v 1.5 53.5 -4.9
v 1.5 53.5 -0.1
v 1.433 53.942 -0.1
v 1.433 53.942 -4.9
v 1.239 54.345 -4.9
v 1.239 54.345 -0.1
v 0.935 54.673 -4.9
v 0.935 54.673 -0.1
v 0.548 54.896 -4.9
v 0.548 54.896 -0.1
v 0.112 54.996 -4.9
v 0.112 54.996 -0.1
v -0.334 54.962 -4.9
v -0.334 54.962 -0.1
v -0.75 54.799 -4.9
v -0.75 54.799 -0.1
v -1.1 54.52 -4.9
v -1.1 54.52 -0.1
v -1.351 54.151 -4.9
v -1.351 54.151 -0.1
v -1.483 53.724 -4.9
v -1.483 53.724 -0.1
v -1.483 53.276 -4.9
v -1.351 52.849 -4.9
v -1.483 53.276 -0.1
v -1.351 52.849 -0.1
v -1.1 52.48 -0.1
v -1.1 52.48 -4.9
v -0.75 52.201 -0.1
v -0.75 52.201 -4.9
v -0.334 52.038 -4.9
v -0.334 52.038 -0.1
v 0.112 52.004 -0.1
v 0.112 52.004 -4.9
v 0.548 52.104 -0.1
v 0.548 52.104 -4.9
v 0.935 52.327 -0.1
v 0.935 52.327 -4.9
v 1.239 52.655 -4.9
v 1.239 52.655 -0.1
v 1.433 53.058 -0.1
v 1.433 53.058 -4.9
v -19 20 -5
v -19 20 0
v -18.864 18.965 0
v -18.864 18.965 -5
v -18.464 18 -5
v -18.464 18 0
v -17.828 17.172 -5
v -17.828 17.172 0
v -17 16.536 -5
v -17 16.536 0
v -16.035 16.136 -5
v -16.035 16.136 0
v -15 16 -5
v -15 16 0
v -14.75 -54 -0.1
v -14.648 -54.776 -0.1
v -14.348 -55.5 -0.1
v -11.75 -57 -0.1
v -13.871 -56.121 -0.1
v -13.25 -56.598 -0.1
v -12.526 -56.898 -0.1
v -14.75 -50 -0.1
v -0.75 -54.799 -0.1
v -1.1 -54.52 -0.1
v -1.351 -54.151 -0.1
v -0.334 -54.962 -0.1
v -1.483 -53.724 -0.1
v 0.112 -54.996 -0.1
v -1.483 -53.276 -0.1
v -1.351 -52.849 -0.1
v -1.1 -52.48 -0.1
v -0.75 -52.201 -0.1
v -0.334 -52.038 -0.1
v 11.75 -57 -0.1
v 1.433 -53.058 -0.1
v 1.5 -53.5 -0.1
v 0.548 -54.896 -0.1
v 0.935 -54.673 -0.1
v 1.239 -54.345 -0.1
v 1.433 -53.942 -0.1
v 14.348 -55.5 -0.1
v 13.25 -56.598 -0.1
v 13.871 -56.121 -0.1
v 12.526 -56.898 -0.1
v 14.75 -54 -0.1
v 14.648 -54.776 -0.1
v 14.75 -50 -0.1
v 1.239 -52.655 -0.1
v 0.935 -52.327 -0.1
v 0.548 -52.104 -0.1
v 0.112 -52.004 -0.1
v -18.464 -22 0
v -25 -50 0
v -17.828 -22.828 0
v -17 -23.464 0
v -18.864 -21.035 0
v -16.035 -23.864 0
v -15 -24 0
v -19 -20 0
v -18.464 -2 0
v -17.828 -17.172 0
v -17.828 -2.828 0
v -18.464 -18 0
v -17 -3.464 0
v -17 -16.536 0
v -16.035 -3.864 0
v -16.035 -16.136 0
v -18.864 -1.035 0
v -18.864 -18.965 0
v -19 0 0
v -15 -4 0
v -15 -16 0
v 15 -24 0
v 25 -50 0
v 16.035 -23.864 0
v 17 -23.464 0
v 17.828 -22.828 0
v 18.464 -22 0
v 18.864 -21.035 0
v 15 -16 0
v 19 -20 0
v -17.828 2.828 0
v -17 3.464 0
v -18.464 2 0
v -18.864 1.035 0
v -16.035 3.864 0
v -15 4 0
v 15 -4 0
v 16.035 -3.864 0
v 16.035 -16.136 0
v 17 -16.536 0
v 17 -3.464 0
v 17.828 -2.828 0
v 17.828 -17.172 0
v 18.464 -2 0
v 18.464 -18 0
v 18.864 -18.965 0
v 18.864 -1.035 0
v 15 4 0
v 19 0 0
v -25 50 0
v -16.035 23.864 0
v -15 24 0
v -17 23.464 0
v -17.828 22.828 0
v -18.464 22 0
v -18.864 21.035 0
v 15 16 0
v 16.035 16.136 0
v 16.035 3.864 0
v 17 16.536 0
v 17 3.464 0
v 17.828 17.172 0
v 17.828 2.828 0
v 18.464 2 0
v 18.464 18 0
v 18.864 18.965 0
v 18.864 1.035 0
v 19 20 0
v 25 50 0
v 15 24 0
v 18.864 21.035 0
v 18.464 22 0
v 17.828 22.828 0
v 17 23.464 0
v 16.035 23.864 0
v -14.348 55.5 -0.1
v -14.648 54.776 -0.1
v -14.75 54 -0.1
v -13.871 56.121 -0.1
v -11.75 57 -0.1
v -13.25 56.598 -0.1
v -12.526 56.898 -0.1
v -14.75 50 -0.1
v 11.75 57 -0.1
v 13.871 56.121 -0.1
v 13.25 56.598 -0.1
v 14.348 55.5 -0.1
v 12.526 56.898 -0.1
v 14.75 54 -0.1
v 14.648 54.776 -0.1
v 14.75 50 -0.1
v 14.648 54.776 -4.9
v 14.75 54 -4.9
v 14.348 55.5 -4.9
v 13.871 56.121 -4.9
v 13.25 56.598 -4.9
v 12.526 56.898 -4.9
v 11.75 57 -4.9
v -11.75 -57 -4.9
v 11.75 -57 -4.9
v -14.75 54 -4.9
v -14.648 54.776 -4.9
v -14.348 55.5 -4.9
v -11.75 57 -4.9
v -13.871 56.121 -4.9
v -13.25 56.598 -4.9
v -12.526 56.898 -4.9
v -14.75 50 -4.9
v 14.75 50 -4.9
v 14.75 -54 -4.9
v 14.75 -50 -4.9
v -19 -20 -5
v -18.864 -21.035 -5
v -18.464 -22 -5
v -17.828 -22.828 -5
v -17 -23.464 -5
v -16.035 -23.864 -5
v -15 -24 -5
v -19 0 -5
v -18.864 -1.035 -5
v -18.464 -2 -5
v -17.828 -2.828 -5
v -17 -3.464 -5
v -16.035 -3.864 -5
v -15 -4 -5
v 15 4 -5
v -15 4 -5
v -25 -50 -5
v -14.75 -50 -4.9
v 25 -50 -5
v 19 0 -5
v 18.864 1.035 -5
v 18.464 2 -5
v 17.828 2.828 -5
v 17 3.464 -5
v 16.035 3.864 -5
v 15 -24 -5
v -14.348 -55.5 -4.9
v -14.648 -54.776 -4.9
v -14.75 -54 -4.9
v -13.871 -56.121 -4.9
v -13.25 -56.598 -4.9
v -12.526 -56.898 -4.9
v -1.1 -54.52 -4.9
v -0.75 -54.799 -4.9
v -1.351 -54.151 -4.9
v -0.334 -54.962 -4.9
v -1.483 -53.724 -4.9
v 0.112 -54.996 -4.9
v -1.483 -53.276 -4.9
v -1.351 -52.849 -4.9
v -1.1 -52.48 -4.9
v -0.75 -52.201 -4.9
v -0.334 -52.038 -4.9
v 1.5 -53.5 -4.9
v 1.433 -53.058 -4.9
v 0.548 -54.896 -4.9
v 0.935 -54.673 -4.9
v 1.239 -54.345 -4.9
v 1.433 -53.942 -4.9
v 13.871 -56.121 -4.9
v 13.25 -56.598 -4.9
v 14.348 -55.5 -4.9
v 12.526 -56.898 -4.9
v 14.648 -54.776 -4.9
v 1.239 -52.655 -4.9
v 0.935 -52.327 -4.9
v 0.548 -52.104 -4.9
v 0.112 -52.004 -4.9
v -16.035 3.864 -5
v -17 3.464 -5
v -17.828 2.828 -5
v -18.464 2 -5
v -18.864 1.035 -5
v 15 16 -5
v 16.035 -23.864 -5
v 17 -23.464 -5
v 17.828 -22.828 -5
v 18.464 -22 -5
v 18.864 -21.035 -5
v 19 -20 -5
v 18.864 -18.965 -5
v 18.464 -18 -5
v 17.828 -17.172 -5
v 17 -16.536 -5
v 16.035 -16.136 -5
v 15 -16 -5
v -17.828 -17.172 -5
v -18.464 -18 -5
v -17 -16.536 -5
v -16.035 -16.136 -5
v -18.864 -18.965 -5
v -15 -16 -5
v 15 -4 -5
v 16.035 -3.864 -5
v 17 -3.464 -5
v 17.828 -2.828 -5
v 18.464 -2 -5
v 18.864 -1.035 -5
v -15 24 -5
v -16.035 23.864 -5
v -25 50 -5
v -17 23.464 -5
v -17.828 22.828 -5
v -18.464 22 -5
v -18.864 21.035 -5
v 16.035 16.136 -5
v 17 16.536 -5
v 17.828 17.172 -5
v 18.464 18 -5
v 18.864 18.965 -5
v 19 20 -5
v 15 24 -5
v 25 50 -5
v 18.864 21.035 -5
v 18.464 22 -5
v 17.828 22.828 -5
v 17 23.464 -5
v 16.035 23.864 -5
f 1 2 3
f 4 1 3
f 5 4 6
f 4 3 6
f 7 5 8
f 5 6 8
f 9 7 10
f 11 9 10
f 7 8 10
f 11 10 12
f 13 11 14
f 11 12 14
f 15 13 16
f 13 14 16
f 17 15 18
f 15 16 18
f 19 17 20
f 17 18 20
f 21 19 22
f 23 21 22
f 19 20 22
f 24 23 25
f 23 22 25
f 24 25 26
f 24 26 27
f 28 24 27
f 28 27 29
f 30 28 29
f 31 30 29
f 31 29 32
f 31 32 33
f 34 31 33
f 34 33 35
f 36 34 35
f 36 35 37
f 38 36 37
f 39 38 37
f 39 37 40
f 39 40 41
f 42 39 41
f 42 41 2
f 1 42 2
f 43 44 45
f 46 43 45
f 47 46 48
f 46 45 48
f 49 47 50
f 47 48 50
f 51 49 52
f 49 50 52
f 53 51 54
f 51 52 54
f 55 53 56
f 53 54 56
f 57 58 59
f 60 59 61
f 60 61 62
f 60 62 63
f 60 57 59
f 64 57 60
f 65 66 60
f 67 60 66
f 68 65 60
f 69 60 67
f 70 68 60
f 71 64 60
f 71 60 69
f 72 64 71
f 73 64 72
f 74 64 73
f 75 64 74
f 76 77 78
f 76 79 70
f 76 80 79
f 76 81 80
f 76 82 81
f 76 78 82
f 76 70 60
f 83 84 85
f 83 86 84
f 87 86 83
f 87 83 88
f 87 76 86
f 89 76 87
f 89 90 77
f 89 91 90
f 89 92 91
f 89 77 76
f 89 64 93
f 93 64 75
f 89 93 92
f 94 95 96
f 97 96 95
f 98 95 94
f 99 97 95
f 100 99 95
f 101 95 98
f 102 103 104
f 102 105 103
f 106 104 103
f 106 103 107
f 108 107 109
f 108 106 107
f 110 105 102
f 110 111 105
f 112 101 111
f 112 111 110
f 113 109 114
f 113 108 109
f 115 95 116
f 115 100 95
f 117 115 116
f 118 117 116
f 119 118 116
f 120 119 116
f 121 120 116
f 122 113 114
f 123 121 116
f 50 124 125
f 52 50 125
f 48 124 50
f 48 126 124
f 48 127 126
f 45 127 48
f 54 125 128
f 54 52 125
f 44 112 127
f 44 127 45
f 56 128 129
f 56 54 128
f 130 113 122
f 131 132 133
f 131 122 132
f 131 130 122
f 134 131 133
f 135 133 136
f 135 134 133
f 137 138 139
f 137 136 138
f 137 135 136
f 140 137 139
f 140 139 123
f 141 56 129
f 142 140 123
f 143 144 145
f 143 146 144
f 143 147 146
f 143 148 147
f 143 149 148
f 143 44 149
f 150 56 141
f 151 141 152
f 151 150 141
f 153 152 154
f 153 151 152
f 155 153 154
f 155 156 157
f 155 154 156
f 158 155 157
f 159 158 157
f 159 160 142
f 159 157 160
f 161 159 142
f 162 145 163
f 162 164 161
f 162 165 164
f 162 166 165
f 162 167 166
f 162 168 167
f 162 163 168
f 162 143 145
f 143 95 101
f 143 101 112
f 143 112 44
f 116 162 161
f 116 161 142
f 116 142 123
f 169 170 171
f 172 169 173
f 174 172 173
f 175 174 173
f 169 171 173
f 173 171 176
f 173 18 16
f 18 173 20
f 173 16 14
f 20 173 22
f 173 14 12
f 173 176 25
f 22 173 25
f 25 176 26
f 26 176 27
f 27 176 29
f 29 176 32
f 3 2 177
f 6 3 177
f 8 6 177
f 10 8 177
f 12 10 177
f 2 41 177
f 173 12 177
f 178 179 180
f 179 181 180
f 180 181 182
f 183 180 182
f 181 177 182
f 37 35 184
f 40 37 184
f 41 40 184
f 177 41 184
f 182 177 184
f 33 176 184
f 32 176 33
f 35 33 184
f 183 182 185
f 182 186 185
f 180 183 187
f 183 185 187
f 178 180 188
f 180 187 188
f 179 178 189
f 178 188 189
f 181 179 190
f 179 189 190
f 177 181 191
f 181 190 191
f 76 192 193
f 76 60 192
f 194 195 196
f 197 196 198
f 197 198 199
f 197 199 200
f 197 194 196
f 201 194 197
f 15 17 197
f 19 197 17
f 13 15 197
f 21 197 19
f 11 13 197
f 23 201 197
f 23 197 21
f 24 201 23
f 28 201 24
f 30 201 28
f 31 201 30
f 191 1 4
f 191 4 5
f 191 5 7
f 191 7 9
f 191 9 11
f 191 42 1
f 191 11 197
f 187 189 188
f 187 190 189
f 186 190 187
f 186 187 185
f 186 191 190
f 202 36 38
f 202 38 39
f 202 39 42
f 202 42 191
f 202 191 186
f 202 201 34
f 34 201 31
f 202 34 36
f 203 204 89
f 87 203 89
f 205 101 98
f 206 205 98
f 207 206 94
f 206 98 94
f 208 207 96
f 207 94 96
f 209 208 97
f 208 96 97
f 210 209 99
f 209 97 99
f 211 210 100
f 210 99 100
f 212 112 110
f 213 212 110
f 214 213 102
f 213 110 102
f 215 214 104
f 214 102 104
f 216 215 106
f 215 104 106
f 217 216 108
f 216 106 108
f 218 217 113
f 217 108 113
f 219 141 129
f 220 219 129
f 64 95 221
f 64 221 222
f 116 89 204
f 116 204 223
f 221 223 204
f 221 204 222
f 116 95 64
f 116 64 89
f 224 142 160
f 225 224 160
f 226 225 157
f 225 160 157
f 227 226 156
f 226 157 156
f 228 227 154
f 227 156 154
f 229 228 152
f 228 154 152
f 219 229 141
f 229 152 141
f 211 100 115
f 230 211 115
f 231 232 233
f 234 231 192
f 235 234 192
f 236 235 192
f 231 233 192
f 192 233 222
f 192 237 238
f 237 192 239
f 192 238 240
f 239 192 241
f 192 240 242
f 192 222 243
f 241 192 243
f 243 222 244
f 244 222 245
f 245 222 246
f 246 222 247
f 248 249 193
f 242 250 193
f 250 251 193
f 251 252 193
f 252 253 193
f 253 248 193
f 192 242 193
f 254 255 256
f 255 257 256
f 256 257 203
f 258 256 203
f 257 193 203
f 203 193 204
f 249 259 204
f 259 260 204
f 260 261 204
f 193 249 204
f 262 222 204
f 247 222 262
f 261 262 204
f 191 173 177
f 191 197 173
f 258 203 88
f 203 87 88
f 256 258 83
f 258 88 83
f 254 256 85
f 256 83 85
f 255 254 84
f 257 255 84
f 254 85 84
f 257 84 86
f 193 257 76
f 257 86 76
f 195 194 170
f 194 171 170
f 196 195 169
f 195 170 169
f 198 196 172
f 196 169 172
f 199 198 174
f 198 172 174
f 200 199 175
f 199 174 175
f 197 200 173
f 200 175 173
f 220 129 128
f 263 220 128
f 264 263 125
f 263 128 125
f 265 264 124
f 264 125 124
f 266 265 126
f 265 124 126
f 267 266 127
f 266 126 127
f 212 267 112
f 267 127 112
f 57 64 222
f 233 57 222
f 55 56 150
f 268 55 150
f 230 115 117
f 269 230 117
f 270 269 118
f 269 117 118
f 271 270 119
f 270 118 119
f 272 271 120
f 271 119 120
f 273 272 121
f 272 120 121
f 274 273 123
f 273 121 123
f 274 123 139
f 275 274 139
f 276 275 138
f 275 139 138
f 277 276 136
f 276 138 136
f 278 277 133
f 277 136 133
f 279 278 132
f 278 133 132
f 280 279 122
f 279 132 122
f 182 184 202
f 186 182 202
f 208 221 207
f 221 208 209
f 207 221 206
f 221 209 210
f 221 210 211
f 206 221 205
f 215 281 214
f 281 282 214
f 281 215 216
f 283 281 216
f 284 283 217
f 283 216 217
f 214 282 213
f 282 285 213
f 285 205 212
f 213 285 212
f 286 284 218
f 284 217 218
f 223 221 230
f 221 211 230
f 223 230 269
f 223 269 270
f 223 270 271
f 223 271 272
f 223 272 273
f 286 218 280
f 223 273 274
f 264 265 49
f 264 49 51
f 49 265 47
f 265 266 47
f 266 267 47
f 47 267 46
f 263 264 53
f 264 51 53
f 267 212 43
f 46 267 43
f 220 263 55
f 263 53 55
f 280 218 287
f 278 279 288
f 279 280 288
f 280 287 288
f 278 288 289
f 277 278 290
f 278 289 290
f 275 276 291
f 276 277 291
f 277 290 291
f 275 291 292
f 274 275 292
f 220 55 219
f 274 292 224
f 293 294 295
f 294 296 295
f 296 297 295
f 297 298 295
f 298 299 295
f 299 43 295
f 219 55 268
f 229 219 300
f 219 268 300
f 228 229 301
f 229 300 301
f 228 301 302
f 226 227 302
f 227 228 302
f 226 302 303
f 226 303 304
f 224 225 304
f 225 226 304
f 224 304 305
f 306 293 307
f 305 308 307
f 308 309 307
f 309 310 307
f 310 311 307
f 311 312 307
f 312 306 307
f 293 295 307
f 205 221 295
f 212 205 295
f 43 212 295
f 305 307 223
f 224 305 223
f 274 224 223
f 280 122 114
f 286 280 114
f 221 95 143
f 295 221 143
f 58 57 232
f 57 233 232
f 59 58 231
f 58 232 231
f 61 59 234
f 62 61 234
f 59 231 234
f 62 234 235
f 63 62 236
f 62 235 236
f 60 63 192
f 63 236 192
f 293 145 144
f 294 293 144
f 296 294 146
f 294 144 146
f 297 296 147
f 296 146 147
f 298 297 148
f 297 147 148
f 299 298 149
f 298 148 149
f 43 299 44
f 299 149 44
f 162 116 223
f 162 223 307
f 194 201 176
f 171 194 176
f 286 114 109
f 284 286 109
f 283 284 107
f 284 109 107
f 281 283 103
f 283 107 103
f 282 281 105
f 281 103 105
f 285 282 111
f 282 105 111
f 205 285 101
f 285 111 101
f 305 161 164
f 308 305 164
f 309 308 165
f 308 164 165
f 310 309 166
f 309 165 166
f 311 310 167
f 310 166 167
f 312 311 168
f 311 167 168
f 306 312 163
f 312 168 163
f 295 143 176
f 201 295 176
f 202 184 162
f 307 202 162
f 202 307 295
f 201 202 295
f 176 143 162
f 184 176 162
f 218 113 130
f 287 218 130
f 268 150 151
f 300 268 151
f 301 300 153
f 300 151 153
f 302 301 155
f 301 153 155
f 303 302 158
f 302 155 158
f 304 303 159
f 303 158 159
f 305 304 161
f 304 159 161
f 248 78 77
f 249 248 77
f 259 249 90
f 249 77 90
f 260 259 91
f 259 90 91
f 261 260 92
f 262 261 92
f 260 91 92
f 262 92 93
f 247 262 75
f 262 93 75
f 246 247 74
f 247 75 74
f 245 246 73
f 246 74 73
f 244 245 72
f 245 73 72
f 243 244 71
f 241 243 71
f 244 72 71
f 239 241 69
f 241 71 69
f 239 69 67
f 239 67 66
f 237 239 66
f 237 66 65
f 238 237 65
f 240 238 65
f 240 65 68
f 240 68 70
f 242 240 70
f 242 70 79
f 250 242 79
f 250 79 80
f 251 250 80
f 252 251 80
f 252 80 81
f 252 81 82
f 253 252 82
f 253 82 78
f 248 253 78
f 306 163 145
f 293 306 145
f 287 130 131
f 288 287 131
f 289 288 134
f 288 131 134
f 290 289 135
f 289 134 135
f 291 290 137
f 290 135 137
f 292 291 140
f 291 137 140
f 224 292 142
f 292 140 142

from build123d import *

# Parameters (mm, degrees)
SKETCH_1_W          = 50
SKETCH_1_H          = 100
EXTRUDE_1_DEPTH     = 5
SKETCH_2_W          = 29.5
SKETCH_2_H          = 2.4
EXTRUDE_2_DEPTH     = 7
SKETCH_3_W          = 29.5
SKETCH_3_H          = 2.4
EXTRUDE_3_DEPTH     = 7
CUT_EXTRUDE_1_DEPTH = 5
FILLET_1_R          = 3
SKETCH_5_R          = 1.5
CUT_EXTRUDE_2_DEPTH = 5.9
SKETCH_6_R          = 1.5
CUT_EXTRUDE_3_DEPTH = 5.9


with BuildPart() as part:
    # 草图1 → 凸台-拉伸1 (new body)
    with BuildSketch(Plane.XY):
        Rectangle(SKETCH_1_W, SKETCH_1_H)
    extrude(amount=-EXTRUDE_1_DEPTH)

    # 草图2 → 凸台-拉伸2 (add)
    with BuildSketch(Plane(origin=(0, 50, 0), x_dir=(1, 0, 0), z_dir=(0, 1, 0))):
        with Locations((0, 3.7)):
            Rectangle(SKETCH_2_W, SKETCH_2_H)
        with Locations((0, 1.3)):
            Rectangle(SKETCH_2_W, SKETCH_2_H)
    extrude(amount=EXTRUDE_2_DEPTH)

    # 草图3 → 凸台-拉伸3 (add)
    with BuildSketch(Plane.XZ.offset(50)):
        with Locations((0, -1.3)):
            Rectangle(SKETCH_3_W, SKETCH_3_H)
        with Locations((0, -3.7)):
            Rectangle(SKETCH_3_W, SKETCH_3_H)
    extrude(amount=EXTRUDE_3_DEPTH)

    # 草图4 → 切除-拉伸1 (cut)
    with BuildSketch(Plane.XY):
        with BuildLine():
            Line((0, 20), (0, 24))
            Line((0, 24), (-15, 24))
            ThreePointArc((-15, 24), (-17.828427125, 22.828427125), (-19, 20))
            Line((-19, 20), (0, 20))
        make_face()
        with BuildLine():
            Line((15, 24), (0, 24))
            Line((0, 24), (0, 20))
            Line((0, 20), (19, 20))
            ThreePointArc((19, 20), (17.828427125, 22.828427125), (15, 24))
        make_face()
        with BuildLine():
            Line((0, 16), (0, 20))
            Line((0, 20), (-19, 20))
            ThreePointArc((-19, 20), (-17.828427125, 17.171572875), (-15, 16))
            Line((-15, 16), (0, 16))
        make_face()
        with BuildLine():
            Line((19, 20), (0, 20))
            Line((0, 20), (0, 16))
            Line((0, 16), (15, 16))
            ThreePointArc((15, 16), (17.828427125, 17.171572875), (19, 20))
        make_face()
        with BuildLine():
            Line((0, 0), (0, 4))
            Line((0, 4), (-15, 4))
            ThreePointArc((-15, 4), (-17.828427125, 2.828427125), (-19, 0))
            Line((-19, 0), (0, 0))
        make_face()
        with BuildLine():
            Line((15, 4), (0, 4))
            Line((0, 4), (0, 0))
            Line((0, 0), (19, 0))
            ThreePointArc((19, 0), (17.828427125, 2.828427125), (15, 4))
        make_face()
        with BuildLine():
            Line((0, -4), (0, 0))
            Line((0, 0), (-19, 0))
            ThreePointArc((-19, 0), (-17.828427125, -2.828427125), (-15, -4))
            Line((-15, -4), (0, -4))
        make_face()
        with BuildLine():
            Line((19, 0), (0, 0))
            Line((0, 0), (0, -4))
            Line((0, -4), (15, -4))
            ThreePointArc((15, -4), (17.828427125, -2.828427125), (19, 0))
        make_face()
        with BuildLine():
            Line((0, -20), (0, -16))
            Line((0, -16), (-15, -16))
            ThreePointArc((-15, -16), (-17.828427125, -17.171572875), (-19, -20))
            Line((-19, -20), (0, -20))
        make_face()
        with BuildLine():
            Line((0, -24), (0, -20))
            Line((0, -20), (-19, -20))
            ThreePointArc((-19, -20), (-17.828427125, -22.828427125), (-15, -24))
            Line((-15, -24), (0, -24))
        make_face()
        with BuildLine():
            Line((15, -16), (0, -16))
            Line((0, -16), (0, -20))
            Line((0, -20), (19, -20))
            ThreePointArc((19, -20), (17.828427125, -17.171572875), (15, -16))
        make_face()
        with BuildLine():
            Line((19, -20), (0, -20))
            Line((0, -20), (0, -24))
            Line((0, -24), (15, -24))
            ThreePointArc((15, -24), (17.828427125, -22.828427125), (19, -20))
        make_face()
    extrude(amount=-CUT_EXTRUDE_1_DEPTH, mode=Mode.SUBTRACT)

    # 圆角1
    fillet_1_edges = [part.edges().sort_by_distance(p)[0] for p in [
        (14.75, 57, -2.5),
        (-14.75, 57, -2.5),
        (14.75, -57, -2.5),
        (-14.75, -57, -2.5),
    ]]
    fillet(fillet_1_edges, radius=FILLET_1_R)

    # 草图5 → 切除-拉伸2 (cut, through all)
    with BuildSketch(Plane.XY.offset(-0.1)):
        with Locations((0, 53.5)):
            Circle(SKETCH_5_R)
    extrude(amount=-CUT_EXTRUDE_2_DEPTH, mode=Mode.SUBTRACT)

    # 草图6 → 切除-拉伸3 (cut, through all)
    with BuildSketch(Plane.XY.offset(-0.1)):
        with Locations((0, -53.5)):
            Circle(SKETCH_6_R)
    extrude(amount=-CUT_EXTRUDE_3_DEPTH, mode=Mode.SUBTRACT)


solid = part.part
